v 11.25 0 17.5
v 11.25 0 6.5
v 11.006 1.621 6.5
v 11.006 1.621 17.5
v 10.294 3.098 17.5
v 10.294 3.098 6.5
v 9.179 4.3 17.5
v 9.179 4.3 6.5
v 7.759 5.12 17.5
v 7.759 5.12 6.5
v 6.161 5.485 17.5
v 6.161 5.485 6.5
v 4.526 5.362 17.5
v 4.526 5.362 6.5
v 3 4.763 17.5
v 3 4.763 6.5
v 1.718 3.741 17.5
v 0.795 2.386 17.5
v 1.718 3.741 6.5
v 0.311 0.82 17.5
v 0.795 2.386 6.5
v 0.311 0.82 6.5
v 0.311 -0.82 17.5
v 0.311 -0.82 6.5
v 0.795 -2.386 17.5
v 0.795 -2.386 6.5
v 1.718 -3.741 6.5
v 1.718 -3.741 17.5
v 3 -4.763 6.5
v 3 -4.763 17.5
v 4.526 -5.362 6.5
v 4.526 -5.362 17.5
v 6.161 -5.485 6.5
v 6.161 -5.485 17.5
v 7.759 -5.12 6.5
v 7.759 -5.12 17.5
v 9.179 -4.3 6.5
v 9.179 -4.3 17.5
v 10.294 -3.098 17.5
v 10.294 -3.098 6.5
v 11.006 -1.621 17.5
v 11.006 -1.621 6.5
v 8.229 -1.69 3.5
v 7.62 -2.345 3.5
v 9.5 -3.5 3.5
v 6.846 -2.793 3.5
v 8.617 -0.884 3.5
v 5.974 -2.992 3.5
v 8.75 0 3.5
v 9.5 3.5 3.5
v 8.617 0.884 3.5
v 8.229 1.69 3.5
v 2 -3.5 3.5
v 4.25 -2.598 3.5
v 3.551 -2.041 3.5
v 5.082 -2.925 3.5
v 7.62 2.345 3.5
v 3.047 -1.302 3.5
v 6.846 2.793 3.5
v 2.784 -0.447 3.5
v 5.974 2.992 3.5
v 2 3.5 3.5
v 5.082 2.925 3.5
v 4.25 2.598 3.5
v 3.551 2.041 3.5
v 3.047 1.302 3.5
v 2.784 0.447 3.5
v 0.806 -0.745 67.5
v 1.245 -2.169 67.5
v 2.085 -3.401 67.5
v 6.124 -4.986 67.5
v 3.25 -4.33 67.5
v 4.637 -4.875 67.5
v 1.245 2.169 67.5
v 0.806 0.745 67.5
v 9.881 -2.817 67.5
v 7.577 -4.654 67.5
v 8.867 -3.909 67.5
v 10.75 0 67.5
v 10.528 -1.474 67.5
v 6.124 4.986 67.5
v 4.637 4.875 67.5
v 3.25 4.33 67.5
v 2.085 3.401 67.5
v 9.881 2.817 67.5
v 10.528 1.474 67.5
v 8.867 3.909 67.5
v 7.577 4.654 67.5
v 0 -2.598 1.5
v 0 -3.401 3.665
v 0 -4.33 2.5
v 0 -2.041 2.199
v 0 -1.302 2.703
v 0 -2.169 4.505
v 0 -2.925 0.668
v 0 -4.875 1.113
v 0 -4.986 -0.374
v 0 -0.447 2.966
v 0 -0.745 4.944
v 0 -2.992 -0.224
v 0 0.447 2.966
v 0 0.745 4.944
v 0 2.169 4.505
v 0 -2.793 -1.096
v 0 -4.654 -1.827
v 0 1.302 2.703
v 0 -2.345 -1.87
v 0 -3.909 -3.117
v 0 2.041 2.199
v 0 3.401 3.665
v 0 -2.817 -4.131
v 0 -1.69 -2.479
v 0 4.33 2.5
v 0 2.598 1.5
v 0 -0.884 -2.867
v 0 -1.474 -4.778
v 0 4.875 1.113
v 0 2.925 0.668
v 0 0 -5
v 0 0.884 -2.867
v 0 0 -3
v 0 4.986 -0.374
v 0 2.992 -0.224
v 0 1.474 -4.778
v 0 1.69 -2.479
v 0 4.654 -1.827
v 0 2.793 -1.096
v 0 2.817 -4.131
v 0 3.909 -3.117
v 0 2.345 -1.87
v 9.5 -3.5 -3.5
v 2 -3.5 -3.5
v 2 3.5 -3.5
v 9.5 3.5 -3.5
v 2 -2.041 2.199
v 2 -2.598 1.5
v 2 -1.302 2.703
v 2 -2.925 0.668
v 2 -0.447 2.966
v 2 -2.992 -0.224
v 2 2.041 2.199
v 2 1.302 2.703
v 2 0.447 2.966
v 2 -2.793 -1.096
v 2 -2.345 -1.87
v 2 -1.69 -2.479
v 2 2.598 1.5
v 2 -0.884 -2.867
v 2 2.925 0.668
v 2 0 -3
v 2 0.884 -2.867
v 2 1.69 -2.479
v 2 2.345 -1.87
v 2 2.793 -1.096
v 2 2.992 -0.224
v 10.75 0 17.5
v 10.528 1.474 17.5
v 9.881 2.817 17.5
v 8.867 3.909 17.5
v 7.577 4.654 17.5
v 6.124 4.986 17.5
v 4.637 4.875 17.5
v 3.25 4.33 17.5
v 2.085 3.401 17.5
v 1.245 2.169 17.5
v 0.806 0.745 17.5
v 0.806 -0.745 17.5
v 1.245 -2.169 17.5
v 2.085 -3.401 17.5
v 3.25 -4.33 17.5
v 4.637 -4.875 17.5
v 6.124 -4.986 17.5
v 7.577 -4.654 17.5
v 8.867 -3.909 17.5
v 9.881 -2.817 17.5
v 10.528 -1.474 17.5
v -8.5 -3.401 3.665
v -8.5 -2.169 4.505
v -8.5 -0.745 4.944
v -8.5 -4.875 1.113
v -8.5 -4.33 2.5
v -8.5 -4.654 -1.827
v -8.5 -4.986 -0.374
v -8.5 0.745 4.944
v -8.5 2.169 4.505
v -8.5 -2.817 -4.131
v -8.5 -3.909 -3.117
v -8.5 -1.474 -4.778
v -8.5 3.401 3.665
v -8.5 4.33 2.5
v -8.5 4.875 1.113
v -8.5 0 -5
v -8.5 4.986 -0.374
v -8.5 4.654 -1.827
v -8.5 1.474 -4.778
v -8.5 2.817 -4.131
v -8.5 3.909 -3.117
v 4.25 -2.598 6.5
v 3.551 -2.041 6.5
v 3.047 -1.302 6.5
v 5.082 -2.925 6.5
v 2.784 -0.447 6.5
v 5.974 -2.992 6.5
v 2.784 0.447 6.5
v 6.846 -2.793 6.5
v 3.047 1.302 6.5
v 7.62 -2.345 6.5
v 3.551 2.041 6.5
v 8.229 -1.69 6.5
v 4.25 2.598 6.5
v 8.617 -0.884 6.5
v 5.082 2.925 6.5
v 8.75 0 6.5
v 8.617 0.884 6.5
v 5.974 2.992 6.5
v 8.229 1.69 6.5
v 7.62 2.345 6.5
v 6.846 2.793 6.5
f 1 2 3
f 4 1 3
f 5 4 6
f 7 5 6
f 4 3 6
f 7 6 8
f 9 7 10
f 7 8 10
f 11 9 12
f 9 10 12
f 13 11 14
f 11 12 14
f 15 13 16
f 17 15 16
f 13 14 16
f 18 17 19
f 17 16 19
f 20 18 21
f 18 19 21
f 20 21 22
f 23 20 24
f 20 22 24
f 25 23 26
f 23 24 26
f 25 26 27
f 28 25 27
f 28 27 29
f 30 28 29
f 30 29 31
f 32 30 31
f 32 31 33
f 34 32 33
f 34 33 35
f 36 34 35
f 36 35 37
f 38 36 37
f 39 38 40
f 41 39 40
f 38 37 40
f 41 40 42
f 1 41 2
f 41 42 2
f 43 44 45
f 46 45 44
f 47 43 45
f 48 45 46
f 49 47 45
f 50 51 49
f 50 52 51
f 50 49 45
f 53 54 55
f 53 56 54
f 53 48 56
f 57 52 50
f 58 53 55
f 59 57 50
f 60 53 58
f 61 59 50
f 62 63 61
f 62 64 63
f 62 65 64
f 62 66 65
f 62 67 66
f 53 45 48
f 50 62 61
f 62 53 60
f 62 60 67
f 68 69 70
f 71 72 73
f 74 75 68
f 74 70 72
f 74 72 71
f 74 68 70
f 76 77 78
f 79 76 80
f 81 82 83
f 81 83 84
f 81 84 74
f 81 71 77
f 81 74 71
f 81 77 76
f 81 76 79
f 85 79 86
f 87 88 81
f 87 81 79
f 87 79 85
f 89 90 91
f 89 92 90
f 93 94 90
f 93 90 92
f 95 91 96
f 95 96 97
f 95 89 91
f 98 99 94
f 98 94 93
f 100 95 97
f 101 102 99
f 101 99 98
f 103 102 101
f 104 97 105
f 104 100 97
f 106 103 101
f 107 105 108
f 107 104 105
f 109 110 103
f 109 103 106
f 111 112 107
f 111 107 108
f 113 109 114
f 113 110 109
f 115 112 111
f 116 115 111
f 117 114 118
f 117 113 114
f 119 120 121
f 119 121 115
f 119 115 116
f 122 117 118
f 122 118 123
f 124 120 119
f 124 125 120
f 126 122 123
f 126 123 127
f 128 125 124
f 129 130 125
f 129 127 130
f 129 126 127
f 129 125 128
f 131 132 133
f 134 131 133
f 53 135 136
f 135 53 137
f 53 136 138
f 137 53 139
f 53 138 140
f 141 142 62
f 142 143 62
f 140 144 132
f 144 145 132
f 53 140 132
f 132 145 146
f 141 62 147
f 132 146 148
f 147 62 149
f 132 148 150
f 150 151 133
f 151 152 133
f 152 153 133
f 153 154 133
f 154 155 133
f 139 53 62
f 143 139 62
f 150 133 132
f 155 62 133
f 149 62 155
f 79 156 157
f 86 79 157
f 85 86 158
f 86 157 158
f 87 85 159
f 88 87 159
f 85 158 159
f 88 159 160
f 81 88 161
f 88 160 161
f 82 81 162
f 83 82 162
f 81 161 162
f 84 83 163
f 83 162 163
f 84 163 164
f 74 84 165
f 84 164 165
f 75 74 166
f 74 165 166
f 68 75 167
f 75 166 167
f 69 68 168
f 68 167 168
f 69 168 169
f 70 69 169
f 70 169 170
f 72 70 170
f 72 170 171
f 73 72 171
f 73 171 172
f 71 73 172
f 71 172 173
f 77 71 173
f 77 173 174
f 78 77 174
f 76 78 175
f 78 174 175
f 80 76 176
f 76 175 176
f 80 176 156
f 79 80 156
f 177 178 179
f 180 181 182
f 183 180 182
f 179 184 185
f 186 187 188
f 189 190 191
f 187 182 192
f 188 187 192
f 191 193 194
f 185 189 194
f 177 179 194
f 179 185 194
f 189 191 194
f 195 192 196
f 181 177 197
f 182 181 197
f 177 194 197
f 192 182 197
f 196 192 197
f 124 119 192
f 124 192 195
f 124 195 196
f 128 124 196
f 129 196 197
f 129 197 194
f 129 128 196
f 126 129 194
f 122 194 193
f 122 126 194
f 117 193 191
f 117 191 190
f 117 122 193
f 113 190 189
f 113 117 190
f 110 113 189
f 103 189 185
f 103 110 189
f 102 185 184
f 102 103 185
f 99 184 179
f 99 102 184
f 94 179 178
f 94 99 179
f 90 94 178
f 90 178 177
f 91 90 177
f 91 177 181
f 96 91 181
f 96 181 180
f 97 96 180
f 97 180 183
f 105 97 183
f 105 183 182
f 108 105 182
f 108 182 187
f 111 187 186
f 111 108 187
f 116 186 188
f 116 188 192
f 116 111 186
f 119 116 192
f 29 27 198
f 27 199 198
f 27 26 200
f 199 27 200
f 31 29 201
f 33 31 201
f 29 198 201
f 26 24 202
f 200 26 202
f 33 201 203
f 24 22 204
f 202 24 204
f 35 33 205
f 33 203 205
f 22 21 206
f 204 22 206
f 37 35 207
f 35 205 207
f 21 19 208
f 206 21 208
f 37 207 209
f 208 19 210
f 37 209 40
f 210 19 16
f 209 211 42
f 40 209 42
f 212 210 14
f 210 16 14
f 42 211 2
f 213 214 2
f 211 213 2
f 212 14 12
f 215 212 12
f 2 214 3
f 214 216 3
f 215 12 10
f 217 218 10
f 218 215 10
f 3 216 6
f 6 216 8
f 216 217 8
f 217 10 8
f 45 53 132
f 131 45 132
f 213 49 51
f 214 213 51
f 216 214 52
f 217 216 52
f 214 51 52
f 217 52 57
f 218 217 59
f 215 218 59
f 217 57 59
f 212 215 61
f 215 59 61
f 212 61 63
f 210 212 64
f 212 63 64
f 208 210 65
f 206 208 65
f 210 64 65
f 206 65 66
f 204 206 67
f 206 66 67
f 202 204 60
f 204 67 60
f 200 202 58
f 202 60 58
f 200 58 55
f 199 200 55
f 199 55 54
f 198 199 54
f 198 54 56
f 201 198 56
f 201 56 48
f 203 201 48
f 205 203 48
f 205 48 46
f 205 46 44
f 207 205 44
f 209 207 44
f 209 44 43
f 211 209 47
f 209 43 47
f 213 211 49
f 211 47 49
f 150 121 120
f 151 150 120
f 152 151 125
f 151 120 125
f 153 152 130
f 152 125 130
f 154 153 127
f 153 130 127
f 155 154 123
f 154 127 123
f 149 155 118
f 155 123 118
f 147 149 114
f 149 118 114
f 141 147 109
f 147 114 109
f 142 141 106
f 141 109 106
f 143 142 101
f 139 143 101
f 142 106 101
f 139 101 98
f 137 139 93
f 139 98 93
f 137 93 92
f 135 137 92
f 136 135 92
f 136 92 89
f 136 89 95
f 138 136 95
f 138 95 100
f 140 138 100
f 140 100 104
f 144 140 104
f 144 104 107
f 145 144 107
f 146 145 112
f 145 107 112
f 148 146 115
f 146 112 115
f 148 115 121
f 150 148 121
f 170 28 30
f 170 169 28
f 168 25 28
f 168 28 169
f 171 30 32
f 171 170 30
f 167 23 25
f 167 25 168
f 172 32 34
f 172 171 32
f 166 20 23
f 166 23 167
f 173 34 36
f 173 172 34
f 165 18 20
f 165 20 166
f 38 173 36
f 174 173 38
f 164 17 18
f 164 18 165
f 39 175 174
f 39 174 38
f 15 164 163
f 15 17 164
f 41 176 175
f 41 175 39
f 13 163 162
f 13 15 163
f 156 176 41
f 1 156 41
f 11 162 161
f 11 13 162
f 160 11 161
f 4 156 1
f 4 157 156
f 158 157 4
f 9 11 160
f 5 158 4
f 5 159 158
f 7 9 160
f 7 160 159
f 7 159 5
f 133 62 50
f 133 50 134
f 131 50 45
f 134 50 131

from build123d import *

# Parameters (mm, degrees)
SKETCH1_R              = 5
BARREL_CONNECTOR_DEPTH = 8.5
SKETCH2_R              = 3
BOSS_EXTRUDE2_DEPTH    = 2
SKETCH3_W              = 7
SKETCH3_H              = 7
BOSS_EXTRUDE3_DEPTH    = 7.5
SKETCH4_R              = 3
BOSS_EXTRUDE4_DEPTH    = 3
SKETCH5_R              = 5.5
BOSS_EXTRUDE5_DEPTH    = 11
SKETCH6_R              = 5
BOSS_EXTRUDE6_DEPTH    = 50


with BuildPart() as part:
    # Sketch1 → Barrel Connector (new body)
    with BuildSketch(Plane(origin=(0, 0, 0), x_dir=(0, 0, -1), z_dir=(1, 0, 0))):
        Circle(SKETCH1_R)
    extrude(amount=-BARREL_CONNECTOR_DEPTH)

    # Sketch2 → Boss-Extrude2 (add)
    with BuildSketch(Plane(origin=(0, 0, 0), x_dir=(0, 0, -1), z_dir=(1, 0, 0))):
        Circle(SKETCH2_R)
    extrude(amount=BOSS_EXTRUDE2_DEPTH)

    # Sketch3 → Boss-Extrude3 (add)
    with BuildSketch(Plane(origin=(2, 0, 0), x_dir=(0, 0, -1), z_dir=(1, 0, 0))):
        Rectangle(SKETCH3_W, SKETCH3_H)
    extrude(amount=BOSS_EXTRUDE3_DEPTH)

    # Sketch4 → Boss-Extrude4 (add)
    with BuildSketch(Plane.XY.offset(3.5)):
        with Locations((5.75, 0)):
            Circle(SKETCH4_R)
    extrude(amount=BOSS_EXTRUDE4_DEPTH)

    # Sketch5 → Boss-Extrude5 (add)
    with BuildSketch(Plane.XY.offset(6.5)):
        with Locations((5.75, 0)):
            Circle(SKETCH5_R)
    extrude(amount=BOSS_EXTRUDE5_DEPTH)

    # Sketch6 → Boss-Extrude6 (add)
    with BuildSketch(Plane.XY.offset(17.5)):
        with Locations((5.75, 0)):
            Circle(SKETCH6_R)
    extrude(amount=BOSS_EXTRUDE6_DEPTH)


solid = part.part
